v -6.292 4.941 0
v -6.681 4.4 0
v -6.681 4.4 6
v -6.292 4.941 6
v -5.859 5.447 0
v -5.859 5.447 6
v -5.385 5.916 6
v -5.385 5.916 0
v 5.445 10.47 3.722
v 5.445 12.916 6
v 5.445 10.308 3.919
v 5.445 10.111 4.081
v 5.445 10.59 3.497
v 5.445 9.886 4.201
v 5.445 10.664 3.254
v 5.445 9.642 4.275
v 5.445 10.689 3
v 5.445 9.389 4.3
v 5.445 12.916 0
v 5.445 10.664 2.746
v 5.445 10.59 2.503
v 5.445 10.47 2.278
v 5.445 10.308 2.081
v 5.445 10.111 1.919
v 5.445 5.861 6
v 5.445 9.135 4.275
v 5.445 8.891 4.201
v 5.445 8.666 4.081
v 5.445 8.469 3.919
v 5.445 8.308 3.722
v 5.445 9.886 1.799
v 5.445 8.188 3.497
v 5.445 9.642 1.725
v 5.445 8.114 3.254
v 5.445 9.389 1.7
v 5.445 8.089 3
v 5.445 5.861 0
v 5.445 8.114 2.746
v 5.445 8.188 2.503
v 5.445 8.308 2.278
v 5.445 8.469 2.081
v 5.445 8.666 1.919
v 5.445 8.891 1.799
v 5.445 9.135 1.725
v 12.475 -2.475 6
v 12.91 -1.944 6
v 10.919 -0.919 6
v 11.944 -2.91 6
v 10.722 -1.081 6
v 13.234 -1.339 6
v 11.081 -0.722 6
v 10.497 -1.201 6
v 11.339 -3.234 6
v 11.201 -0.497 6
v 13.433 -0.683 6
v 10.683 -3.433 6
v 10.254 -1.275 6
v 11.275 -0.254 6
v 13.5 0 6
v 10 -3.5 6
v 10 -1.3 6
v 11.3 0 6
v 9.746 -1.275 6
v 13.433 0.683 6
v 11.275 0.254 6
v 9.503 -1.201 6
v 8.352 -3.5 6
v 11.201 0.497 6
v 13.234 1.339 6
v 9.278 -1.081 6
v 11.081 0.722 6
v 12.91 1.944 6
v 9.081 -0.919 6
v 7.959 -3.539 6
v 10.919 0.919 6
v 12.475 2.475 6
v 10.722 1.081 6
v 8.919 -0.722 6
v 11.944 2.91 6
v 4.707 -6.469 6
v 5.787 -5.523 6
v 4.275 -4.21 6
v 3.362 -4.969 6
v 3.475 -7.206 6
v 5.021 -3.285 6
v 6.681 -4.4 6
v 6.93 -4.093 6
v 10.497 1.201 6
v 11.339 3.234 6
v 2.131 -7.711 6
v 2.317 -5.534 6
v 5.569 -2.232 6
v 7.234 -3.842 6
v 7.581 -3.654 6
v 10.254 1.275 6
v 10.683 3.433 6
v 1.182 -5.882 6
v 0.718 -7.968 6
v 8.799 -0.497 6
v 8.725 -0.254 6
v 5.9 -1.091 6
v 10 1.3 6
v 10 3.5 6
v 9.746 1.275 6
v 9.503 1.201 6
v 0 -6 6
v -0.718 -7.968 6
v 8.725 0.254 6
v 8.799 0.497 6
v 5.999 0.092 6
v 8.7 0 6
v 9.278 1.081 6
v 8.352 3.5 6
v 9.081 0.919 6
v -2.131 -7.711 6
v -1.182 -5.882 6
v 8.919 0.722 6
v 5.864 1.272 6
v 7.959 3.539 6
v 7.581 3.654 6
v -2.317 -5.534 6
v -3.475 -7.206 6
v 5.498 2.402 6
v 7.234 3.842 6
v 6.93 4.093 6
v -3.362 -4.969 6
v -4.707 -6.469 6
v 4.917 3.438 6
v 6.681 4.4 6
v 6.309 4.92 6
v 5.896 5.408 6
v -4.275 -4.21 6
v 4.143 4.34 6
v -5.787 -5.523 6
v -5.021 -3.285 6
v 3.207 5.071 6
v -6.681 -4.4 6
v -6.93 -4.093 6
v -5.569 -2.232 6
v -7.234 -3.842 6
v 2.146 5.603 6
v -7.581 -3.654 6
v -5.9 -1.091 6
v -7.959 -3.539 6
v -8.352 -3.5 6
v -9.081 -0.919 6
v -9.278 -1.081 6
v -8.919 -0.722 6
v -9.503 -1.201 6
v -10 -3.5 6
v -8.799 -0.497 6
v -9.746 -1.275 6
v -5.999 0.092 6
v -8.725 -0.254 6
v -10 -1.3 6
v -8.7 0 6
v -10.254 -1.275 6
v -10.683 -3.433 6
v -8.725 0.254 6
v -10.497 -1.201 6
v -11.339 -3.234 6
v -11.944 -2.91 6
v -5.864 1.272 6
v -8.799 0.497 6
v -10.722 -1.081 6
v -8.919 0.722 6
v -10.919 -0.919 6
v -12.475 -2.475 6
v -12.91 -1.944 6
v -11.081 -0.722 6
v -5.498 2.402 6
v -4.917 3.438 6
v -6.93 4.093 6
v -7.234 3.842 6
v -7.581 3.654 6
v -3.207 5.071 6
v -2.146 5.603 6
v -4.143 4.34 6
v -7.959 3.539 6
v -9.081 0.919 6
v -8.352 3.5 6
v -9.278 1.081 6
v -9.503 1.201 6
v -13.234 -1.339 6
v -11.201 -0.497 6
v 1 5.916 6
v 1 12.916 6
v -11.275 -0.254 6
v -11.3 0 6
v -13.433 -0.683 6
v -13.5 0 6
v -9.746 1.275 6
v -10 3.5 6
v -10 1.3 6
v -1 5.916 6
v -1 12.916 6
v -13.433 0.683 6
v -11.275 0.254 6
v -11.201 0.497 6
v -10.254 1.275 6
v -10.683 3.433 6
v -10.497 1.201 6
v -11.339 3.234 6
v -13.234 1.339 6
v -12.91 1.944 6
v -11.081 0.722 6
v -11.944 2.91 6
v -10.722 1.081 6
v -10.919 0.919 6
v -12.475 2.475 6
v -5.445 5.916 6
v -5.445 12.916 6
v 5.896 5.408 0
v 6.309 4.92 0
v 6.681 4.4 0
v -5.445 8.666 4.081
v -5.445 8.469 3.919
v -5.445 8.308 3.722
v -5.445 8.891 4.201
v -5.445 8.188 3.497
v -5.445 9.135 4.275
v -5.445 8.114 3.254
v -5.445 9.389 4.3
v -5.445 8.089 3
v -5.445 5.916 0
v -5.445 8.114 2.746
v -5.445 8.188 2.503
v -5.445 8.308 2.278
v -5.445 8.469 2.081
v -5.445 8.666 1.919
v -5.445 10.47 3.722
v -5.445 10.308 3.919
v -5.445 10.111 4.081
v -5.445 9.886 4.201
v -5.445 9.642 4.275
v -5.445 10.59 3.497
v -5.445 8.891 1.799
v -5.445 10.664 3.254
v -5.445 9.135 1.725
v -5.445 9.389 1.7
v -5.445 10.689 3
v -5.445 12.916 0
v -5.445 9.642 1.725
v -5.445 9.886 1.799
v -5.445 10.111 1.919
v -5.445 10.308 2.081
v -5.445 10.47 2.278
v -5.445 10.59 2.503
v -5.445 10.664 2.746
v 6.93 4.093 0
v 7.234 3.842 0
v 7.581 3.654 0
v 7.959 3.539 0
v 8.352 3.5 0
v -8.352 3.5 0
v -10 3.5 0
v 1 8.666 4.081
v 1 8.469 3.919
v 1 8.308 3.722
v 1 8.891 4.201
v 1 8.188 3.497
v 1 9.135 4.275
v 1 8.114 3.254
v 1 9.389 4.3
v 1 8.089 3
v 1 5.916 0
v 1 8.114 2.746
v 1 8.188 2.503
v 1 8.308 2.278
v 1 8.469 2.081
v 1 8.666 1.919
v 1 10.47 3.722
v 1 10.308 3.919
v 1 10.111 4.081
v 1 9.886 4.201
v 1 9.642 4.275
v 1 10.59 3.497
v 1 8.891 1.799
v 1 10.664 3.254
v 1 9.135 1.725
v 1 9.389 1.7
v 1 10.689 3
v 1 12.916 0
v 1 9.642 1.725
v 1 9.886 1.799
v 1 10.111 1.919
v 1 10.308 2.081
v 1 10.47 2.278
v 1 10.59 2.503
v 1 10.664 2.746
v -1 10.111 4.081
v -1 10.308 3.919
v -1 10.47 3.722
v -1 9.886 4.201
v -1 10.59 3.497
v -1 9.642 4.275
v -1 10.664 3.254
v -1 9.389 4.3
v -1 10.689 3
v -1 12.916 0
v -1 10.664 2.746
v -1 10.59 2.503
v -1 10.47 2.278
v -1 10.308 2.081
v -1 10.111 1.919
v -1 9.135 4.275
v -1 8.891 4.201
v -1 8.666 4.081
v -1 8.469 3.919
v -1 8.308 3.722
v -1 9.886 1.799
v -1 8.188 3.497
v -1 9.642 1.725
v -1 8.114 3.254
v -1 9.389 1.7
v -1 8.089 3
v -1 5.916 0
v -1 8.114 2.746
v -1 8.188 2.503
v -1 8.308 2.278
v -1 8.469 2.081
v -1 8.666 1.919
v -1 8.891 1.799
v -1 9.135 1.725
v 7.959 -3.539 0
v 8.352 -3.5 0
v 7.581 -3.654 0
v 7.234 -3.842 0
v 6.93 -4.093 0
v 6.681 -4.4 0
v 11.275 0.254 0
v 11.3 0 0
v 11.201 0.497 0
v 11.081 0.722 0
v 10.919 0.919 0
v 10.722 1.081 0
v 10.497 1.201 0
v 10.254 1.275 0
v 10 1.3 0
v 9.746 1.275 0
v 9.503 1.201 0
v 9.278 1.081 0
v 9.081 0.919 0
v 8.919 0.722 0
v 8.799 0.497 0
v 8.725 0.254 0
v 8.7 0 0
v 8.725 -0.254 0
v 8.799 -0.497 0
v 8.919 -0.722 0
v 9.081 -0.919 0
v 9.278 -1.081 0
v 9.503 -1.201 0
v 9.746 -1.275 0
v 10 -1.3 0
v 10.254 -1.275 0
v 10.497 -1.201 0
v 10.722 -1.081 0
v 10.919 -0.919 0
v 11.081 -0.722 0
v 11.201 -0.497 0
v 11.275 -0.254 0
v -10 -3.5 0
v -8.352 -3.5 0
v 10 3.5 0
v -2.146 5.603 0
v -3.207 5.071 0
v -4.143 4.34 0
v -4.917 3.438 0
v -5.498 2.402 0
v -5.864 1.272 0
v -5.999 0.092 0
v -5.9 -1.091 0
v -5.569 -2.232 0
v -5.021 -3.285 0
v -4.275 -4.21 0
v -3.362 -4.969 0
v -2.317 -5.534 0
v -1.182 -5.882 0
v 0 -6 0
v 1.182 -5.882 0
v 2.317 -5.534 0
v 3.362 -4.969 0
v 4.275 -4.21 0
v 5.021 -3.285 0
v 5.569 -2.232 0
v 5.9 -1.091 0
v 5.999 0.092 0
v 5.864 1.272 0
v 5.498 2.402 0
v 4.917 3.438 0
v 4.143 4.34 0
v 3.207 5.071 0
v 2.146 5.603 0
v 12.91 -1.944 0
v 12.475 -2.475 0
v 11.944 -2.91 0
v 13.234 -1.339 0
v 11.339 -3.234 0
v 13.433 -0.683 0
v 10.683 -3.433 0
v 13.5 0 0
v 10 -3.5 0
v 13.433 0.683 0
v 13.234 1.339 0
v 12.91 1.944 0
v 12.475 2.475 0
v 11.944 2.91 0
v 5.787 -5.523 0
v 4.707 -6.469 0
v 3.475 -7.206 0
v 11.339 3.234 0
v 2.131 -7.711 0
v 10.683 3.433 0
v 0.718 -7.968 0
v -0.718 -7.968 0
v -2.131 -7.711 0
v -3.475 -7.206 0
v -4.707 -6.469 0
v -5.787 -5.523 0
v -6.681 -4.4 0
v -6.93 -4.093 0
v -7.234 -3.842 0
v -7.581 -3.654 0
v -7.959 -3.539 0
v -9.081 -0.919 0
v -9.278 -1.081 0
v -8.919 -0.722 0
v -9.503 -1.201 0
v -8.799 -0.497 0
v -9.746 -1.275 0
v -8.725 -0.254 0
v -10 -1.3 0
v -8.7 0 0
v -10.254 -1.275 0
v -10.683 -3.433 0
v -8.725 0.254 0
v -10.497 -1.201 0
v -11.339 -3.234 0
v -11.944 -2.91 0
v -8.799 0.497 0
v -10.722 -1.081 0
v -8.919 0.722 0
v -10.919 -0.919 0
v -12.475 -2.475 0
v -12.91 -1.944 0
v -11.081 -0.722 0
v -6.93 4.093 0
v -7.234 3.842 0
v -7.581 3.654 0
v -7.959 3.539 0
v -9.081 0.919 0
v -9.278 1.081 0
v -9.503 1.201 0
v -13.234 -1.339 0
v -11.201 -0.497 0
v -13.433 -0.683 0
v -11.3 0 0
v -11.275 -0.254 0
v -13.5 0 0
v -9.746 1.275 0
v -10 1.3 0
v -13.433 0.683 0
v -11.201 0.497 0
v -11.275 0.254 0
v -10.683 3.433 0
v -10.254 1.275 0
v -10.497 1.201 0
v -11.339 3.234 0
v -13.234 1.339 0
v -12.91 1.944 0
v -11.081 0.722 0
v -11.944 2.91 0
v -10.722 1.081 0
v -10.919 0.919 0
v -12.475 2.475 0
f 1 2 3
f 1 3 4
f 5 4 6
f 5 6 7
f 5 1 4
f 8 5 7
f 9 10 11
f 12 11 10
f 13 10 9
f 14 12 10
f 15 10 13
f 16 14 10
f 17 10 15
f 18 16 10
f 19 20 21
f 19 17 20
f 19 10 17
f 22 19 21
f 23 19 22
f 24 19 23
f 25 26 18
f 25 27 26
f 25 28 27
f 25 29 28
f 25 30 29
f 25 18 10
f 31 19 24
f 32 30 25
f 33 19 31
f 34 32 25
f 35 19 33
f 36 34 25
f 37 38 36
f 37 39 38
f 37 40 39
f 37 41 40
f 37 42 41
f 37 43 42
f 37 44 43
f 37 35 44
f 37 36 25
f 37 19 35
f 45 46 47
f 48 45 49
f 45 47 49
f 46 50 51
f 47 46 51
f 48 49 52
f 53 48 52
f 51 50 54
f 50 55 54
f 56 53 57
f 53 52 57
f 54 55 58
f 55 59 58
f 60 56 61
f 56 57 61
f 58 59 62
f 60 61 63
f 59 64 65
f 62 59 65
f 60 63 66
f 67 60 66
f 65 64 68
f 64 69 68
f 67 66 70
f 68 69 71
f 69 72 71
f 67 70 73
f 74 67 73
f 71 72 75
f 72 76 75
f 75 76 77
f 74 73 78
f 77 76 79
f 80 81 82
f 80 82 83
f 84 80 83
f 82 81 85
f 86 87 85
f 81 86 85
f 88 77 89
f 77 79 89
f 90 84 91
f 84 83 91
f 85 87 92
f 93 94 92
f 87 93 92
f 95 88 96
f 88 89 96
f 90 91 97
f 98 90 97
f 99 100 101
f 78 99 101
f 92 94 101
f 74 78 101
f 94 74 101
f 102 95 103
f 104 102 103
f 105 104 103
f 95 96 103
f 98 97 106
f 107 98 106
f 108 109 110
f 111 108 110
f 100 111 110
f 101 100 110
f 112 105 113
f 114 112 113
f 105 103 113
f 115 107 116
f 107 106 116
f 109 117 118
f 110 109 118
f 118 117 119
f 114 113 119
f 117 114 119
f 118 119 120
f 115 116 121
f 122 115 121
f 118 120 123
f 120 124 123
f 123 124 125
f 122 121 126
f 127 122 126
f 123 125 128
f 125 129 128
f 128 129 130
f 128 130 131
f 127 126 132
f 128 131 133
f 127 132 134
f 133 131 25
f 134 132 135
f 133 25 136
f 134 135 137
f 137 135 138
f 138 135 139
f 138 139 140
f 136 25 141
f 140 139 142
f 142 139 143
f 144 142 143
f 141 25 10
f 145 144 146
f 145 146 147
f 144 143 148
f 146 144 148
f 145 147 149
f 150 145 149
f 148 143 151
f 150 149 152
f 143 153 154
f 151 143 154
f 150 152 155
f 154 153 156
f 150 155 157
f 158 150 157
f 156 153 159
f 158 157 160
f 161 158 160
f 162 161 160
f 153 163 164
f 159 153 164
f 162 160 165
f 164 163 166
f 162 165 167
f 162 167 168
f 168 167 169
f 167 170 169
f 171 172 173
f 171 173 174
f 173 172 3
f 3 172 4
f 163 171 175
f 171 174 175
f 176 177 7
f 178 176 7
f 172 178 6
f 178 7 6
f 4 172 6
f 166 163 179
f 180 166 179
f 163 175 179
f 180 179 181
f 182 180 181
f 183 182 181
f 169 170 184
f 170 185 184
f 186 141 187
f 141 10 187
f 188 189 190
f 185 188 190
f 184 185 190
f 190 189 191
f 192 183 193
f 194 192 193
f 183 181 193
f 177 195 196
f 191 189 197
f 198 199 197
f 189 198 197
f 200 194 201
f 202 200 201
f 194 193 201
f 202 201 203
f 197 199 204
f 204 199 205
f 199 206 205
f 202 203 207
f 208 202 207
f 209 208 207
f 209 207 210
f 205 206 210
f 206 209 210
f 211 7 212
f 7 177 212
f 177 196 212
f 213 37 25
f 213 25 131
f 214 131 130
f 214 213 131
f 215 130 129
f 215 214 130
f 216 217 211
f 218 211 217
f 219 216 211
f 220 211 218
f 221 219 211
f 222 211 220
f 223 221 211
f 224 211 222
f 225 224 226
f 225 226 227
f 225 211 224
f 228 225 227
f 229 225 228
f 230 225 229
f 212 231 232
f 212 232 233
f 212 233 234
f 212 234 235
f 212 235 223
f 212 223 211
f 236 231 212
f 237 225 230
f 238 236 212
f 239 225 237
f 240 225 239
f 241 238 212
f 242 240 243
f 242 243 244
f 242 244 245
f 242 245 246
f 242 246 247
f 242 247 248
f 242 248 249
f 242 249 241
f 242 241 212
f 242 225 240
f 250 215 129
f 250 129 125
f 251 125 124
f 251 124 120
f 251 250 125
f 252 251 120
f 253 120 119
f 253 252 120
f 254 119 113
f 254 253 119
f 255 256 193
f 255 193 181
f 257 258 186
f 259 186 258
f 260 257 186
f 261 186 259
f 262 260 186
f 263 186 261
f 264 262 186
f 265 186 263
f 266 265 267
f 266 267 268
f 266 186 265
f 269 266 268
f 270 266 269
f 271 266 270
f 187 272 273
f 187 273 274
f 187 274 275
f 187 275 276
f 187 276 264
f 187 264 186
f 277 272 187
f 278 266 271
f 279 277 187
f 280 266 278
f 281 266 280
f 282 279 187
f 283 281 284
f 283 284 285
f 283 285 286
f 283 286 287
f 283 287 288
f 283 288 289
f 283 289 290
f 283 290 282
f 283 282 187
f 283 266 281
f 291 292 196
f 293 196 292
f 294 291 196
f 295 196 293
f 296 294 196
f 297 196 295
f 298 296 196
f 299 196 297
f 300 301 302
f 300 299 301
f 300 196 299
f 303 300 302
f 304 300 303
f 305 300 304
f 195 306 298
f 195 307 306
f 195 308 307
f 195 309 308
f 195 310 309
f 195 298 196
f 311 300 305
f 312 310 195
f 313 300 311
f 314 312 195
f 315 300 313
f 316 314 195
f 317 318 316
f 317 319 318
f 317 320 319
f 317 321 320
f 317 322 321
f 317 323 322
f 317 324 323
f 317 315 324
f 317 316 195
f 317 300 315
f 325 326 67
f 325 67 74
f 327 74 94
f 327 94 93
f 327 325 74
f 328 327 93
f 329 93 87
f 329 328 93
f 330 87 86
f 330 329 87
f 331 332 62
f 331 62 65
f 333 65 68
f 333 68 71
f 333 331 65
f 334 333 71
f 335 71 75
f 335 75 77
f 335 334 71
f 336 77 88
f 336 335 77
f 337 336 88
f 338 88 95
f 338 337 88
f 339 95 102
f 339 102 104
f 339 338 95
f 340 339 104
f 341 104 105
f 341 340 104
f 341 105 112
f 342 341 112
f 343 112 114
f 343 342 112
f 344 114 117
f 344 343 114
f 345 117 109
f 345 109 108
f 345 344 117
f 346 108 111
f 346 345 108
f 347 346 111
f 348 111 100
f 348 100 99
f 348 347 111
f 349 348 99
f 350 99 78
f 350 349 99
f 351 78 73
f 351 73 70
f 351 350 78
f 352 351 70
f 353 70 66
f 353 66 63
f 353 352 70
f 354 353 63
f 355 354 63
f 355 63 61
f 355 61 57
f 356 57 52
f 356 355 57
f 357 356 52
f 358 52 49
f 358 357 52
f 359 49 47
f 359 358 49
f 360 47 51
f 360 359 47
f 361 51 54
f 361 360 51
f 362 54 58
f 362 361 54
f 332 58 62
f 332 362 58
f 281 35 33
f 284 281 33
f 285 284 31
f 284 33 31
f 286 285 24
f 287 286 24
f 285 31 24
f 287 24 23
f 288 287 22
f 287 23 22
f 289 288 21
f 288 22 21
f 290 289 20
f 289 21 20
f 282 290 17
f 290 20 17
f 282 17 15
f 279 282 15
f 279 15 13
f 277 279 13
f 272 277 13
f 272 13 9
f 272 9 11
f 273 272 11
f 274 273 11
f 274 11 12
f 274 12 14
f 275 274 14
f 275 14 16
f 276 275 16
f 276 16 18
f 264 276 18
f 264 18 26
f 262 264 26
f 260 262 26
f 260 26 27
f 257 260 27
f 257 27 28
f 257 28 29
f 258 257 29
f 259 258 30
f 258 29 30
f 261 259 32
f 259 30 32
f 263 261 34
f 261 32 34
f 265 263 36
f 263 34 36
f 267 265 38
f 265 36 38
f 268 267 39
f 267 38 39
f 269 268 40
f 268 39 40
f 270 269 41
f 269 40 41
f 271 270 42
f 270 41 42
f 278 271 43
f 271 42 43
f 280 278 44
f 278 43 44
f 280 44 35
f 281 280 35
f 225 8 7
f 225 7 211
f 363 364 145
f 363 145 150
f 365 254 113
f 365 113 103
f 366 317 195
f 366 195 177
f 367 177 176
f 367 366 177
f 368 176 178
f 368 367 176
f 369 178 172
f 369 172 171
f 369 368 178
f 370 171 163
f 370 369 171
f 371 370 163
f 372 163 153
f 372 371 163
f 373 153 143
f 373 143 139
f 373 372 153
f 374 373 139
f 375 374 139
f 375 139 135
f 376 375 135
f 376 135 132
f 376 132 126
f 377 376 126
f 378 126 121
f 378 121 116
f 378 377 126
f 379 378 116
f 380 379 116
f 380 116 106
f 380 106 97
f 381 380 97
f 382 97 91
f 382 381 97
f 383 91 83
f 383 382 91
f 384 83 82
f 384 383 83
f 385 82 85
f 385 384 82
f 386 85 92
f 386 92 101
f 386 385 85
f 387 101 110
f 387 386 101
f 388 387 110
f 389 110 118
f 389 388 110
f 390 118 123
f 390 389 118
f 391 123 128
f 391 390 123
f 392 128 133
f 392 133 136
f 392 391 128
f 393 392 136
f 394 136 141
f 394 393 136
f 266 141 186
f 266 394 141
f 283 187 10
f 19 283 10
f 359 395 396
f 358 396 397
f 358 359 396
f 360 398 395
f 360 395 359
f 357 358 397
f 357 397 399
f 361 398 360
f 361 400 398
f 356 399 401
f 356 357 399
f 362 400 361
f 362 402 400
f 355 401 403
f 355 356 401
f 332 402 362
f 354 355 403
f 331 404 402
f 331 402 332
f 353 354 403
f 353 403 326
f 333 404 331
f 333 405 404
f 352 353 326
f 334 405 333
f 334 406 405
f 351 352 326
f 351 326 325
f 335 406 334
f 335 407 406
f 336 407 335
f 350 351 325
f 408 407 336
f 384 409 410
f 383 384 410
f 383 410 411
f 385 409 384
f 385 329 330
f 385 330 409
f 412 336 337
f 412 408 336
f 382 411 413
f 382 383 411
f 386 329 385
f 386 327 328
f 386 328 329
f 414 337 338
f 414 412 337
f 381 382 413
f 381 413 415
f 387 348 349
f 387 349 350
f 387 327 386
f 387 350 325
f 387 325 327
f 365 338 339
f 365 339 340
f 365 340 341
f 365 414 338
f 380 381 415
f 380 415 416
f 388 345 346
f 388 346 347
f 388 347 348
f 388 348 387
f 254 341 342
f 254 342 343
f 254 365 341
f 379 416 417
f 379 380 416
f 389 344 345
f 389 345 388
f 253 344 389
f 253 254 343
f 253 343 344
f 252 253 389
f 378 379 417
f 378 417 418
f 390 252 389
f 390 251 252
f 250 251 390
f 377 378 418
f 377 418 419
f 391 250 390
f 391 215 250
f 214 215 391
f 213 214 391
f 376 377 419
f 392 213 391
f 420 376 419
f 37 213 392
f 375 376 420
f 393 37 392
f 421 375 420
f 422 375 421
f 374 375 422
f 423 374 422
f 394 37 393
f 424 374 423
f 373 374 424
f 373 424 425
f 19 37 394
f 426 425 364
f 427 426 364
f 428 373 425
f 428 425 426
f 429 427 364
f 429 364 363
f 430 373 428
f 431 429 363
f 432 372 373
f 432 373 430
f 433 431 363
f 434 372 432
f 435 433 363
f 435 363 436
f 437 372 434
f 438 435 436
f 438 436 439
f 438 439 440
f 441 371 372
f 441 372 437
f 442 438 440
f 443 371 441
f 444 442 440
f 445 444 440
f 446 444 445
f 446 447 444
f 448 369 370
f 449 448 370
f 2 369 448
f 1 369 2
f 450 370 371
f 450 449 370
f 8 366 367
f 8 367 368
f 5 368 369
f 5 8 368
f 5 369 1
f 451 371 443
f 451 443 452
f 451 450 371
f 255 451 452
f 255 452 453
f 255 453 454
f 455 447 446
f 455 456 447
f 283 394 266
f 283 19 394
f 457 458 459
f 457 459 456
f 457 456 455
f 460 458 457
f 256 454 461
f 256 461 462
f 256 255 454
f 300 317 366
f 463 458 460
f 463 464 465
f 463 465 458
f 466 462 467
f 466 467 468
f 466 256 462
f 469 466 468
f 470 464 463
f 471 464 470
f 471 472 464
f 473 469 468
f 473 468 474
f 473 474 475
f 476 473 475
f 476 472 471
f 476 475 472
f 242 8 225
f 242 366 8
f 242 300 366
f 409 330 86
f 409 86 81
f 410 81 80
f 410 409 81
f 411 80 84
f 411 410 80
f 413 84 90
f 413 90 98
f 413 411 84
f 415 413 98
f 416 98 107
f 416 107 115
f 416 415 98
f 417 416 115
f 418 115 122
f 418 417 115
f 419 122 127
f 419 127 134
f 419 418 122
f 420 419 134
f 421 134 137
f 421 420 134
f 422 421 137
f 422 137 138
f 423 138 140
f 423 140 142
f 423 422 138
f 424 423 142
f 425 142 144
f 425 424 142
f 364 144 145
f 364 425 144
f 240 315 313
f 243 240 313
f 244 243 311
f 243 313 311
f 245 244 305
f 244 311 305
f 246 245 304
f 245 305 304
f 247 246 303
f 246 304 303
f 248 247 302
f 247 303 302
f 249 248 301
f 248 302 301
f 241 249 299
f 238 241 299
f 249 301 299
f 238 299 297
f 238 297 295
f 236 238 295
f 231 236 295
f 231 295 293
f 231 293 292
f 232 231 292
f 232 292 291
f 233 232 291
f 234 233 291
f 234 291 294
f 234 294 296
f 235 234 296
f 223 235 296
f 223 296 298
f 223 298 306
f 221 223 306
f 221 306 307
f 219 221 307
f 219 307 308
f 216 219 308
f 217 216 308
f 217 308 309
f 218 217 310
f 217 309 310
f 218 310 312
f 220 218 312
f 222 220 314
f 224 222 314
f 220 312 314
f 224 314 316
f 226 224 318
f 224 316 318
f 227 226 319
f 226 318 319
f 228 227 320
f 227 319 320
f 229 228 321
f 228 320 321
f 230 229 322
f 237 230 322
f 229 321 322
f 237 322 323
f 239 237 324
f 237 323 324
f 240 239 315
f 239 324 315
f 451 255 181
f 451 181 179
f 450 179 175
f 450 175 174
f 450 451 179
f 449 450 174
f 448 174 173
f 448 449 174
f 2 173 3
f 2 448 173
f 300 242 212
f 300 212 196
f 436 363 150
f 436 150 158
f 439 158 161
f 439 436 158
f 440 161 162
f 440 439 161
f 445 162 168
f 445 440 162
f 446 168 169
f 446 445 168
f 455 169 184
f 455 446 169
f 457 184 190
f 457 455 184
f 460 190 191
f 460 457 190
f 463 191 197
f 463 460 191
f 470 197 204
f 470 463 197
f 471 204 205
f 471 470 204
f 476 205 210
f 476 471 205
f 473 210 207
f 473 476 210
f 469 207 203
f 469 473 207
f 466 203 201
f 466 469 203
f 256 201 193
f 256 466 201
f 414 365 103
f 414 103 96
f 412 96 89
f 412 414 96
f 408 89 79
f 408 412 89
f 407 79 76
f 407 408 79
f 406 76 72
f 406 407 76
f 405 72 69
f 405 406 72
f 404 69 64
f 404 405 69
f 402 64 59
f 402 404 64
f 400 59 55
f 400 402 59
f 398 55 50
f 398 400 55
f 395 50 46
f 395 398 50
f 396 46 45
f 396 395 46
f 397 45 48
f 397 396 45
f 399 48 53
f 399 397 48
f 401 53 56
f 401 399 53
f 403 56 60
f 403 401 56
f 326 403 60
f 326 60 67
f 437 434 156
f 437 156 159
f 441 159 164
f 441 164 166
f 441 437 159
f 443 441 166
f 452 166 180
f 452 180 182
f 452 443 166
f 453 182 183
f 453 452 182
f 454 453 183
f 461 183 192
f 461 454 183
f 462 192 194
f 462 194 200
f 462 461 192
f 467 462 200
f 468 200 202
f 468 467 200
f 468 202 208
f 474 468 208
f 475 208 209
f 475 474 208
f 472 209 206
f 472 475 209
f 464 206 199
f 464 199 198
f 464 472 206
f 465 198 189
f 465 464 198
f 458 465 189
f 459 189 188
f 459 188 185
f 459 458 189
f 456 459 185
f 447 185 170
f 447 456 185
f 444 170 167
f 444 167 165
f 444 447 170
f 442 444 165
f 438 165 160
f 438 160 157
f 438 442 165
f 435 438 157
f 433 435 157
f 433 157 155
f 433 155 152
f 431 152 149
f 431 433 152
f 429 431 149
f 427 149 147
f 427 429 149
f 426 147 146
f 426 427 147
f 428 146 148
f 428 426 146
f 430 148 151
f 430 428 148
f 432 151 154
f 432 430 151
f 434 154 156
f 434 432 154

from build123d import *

# Parameters (mm, degrees)
SKETCH1_R           = 1.3
BOSS_EXTRUDE1_DEPTH = 6
SKETCH2_R           = 1.3
CUT_EXTRUDE1_DEPTH  = 11


with BuildPart() as part:
    # Sketch1 → Boss-Extrude1 (new body)
    with BuildSketch(Plane.XY):
        with BuildLine():
            Line((-10, 3.5), (-8.351646544, 3.5))
            ThreePointArc((-8.351646544, 3.5), (-7.402963246, 3.739318314), (-6.681317235, 4.4))
            ThreePointArc((-6.681317235, 4.4), (-6.080676089, 5.198593877), (-5.385164807, 5.916079783))
            Line((-5.385164807, 5.916079783), (-5.444775123, 5.916079783))
            Line((-5.444775123, 5.916079783), (-5.444775123, 12.916079783))
            Line((-5.444775123, 12.916079783), (-1, 12.916079783))
            Line((-1, 12.916079783), (-1, 5.916079783))
            ThreePointArc((-1, 5.916079783), (0, -6), (1, 5.916079783))
            Line((1, 5.916079783), (1, 12.916079783))
            Line((1, 12.916079783), (5.444775123, 12.916079783))
            Line((5.444775123, 12.916079783), (5.444775123, 5.861264698))
            ThreePointArc((5.444775123, 5.861264698), (6.106910233, 5.16775071), (6.681317235, 4.4))
            ThreePointArc((6.681317235, 4.4), (7.402963246, 3.739318314), (8.351646544, 3.5))
            Line((8.351646544, 3.5), (10, 3.5))
            ThreePointArc((10, 3.5), (13.5, 0), (10, -3.5))
            Line((10, -3.5), (8.351646544, -3.5))
            ThreePointArc((8.351646544, -3.5), (7.402963246, -3.739318314), (6.681317235, -4.4))
            ThreePointArc((6.681317235, -4.4), (0, -8), (-6.681317235, -4.4))
            ThreePointArc((-6.681317235, -4.4), (-7.402963246, -3.739318314), (-8.351646544, -3.5))
            Line((-8.351646544, -3.5), (-10, -3.5))
            ThreePointArc((-10, -3.5), (-13.5, 0), (-10, 3.5))
        make_face()
        with Locations((-10, 0)):
            Circle(SKETCH1_R, mode=Mode.SUBTRACT)
        with Locations((10, 0)):
            Circle(SKETCH1_R, mode=Mode.SUBTRACT)
    extrude(amount=BOSS_EXTRUDE1_DEPTH)

    # Sketch2 → Cut-Extrude1 (cut)
    with BuildSketch(Plane(origin=(5.444775123, 0, 0), x_dir=(0, 0, -1), z_dir=(1, 0, 0))):
        with Locations((-3, 9.388672241)):
            Circle(SKETCH2_R)
    extrude(amount=-CUT_EXTRUDE1_DEPTH, mode=Mode.SUBTRACT)


solid = part.part
